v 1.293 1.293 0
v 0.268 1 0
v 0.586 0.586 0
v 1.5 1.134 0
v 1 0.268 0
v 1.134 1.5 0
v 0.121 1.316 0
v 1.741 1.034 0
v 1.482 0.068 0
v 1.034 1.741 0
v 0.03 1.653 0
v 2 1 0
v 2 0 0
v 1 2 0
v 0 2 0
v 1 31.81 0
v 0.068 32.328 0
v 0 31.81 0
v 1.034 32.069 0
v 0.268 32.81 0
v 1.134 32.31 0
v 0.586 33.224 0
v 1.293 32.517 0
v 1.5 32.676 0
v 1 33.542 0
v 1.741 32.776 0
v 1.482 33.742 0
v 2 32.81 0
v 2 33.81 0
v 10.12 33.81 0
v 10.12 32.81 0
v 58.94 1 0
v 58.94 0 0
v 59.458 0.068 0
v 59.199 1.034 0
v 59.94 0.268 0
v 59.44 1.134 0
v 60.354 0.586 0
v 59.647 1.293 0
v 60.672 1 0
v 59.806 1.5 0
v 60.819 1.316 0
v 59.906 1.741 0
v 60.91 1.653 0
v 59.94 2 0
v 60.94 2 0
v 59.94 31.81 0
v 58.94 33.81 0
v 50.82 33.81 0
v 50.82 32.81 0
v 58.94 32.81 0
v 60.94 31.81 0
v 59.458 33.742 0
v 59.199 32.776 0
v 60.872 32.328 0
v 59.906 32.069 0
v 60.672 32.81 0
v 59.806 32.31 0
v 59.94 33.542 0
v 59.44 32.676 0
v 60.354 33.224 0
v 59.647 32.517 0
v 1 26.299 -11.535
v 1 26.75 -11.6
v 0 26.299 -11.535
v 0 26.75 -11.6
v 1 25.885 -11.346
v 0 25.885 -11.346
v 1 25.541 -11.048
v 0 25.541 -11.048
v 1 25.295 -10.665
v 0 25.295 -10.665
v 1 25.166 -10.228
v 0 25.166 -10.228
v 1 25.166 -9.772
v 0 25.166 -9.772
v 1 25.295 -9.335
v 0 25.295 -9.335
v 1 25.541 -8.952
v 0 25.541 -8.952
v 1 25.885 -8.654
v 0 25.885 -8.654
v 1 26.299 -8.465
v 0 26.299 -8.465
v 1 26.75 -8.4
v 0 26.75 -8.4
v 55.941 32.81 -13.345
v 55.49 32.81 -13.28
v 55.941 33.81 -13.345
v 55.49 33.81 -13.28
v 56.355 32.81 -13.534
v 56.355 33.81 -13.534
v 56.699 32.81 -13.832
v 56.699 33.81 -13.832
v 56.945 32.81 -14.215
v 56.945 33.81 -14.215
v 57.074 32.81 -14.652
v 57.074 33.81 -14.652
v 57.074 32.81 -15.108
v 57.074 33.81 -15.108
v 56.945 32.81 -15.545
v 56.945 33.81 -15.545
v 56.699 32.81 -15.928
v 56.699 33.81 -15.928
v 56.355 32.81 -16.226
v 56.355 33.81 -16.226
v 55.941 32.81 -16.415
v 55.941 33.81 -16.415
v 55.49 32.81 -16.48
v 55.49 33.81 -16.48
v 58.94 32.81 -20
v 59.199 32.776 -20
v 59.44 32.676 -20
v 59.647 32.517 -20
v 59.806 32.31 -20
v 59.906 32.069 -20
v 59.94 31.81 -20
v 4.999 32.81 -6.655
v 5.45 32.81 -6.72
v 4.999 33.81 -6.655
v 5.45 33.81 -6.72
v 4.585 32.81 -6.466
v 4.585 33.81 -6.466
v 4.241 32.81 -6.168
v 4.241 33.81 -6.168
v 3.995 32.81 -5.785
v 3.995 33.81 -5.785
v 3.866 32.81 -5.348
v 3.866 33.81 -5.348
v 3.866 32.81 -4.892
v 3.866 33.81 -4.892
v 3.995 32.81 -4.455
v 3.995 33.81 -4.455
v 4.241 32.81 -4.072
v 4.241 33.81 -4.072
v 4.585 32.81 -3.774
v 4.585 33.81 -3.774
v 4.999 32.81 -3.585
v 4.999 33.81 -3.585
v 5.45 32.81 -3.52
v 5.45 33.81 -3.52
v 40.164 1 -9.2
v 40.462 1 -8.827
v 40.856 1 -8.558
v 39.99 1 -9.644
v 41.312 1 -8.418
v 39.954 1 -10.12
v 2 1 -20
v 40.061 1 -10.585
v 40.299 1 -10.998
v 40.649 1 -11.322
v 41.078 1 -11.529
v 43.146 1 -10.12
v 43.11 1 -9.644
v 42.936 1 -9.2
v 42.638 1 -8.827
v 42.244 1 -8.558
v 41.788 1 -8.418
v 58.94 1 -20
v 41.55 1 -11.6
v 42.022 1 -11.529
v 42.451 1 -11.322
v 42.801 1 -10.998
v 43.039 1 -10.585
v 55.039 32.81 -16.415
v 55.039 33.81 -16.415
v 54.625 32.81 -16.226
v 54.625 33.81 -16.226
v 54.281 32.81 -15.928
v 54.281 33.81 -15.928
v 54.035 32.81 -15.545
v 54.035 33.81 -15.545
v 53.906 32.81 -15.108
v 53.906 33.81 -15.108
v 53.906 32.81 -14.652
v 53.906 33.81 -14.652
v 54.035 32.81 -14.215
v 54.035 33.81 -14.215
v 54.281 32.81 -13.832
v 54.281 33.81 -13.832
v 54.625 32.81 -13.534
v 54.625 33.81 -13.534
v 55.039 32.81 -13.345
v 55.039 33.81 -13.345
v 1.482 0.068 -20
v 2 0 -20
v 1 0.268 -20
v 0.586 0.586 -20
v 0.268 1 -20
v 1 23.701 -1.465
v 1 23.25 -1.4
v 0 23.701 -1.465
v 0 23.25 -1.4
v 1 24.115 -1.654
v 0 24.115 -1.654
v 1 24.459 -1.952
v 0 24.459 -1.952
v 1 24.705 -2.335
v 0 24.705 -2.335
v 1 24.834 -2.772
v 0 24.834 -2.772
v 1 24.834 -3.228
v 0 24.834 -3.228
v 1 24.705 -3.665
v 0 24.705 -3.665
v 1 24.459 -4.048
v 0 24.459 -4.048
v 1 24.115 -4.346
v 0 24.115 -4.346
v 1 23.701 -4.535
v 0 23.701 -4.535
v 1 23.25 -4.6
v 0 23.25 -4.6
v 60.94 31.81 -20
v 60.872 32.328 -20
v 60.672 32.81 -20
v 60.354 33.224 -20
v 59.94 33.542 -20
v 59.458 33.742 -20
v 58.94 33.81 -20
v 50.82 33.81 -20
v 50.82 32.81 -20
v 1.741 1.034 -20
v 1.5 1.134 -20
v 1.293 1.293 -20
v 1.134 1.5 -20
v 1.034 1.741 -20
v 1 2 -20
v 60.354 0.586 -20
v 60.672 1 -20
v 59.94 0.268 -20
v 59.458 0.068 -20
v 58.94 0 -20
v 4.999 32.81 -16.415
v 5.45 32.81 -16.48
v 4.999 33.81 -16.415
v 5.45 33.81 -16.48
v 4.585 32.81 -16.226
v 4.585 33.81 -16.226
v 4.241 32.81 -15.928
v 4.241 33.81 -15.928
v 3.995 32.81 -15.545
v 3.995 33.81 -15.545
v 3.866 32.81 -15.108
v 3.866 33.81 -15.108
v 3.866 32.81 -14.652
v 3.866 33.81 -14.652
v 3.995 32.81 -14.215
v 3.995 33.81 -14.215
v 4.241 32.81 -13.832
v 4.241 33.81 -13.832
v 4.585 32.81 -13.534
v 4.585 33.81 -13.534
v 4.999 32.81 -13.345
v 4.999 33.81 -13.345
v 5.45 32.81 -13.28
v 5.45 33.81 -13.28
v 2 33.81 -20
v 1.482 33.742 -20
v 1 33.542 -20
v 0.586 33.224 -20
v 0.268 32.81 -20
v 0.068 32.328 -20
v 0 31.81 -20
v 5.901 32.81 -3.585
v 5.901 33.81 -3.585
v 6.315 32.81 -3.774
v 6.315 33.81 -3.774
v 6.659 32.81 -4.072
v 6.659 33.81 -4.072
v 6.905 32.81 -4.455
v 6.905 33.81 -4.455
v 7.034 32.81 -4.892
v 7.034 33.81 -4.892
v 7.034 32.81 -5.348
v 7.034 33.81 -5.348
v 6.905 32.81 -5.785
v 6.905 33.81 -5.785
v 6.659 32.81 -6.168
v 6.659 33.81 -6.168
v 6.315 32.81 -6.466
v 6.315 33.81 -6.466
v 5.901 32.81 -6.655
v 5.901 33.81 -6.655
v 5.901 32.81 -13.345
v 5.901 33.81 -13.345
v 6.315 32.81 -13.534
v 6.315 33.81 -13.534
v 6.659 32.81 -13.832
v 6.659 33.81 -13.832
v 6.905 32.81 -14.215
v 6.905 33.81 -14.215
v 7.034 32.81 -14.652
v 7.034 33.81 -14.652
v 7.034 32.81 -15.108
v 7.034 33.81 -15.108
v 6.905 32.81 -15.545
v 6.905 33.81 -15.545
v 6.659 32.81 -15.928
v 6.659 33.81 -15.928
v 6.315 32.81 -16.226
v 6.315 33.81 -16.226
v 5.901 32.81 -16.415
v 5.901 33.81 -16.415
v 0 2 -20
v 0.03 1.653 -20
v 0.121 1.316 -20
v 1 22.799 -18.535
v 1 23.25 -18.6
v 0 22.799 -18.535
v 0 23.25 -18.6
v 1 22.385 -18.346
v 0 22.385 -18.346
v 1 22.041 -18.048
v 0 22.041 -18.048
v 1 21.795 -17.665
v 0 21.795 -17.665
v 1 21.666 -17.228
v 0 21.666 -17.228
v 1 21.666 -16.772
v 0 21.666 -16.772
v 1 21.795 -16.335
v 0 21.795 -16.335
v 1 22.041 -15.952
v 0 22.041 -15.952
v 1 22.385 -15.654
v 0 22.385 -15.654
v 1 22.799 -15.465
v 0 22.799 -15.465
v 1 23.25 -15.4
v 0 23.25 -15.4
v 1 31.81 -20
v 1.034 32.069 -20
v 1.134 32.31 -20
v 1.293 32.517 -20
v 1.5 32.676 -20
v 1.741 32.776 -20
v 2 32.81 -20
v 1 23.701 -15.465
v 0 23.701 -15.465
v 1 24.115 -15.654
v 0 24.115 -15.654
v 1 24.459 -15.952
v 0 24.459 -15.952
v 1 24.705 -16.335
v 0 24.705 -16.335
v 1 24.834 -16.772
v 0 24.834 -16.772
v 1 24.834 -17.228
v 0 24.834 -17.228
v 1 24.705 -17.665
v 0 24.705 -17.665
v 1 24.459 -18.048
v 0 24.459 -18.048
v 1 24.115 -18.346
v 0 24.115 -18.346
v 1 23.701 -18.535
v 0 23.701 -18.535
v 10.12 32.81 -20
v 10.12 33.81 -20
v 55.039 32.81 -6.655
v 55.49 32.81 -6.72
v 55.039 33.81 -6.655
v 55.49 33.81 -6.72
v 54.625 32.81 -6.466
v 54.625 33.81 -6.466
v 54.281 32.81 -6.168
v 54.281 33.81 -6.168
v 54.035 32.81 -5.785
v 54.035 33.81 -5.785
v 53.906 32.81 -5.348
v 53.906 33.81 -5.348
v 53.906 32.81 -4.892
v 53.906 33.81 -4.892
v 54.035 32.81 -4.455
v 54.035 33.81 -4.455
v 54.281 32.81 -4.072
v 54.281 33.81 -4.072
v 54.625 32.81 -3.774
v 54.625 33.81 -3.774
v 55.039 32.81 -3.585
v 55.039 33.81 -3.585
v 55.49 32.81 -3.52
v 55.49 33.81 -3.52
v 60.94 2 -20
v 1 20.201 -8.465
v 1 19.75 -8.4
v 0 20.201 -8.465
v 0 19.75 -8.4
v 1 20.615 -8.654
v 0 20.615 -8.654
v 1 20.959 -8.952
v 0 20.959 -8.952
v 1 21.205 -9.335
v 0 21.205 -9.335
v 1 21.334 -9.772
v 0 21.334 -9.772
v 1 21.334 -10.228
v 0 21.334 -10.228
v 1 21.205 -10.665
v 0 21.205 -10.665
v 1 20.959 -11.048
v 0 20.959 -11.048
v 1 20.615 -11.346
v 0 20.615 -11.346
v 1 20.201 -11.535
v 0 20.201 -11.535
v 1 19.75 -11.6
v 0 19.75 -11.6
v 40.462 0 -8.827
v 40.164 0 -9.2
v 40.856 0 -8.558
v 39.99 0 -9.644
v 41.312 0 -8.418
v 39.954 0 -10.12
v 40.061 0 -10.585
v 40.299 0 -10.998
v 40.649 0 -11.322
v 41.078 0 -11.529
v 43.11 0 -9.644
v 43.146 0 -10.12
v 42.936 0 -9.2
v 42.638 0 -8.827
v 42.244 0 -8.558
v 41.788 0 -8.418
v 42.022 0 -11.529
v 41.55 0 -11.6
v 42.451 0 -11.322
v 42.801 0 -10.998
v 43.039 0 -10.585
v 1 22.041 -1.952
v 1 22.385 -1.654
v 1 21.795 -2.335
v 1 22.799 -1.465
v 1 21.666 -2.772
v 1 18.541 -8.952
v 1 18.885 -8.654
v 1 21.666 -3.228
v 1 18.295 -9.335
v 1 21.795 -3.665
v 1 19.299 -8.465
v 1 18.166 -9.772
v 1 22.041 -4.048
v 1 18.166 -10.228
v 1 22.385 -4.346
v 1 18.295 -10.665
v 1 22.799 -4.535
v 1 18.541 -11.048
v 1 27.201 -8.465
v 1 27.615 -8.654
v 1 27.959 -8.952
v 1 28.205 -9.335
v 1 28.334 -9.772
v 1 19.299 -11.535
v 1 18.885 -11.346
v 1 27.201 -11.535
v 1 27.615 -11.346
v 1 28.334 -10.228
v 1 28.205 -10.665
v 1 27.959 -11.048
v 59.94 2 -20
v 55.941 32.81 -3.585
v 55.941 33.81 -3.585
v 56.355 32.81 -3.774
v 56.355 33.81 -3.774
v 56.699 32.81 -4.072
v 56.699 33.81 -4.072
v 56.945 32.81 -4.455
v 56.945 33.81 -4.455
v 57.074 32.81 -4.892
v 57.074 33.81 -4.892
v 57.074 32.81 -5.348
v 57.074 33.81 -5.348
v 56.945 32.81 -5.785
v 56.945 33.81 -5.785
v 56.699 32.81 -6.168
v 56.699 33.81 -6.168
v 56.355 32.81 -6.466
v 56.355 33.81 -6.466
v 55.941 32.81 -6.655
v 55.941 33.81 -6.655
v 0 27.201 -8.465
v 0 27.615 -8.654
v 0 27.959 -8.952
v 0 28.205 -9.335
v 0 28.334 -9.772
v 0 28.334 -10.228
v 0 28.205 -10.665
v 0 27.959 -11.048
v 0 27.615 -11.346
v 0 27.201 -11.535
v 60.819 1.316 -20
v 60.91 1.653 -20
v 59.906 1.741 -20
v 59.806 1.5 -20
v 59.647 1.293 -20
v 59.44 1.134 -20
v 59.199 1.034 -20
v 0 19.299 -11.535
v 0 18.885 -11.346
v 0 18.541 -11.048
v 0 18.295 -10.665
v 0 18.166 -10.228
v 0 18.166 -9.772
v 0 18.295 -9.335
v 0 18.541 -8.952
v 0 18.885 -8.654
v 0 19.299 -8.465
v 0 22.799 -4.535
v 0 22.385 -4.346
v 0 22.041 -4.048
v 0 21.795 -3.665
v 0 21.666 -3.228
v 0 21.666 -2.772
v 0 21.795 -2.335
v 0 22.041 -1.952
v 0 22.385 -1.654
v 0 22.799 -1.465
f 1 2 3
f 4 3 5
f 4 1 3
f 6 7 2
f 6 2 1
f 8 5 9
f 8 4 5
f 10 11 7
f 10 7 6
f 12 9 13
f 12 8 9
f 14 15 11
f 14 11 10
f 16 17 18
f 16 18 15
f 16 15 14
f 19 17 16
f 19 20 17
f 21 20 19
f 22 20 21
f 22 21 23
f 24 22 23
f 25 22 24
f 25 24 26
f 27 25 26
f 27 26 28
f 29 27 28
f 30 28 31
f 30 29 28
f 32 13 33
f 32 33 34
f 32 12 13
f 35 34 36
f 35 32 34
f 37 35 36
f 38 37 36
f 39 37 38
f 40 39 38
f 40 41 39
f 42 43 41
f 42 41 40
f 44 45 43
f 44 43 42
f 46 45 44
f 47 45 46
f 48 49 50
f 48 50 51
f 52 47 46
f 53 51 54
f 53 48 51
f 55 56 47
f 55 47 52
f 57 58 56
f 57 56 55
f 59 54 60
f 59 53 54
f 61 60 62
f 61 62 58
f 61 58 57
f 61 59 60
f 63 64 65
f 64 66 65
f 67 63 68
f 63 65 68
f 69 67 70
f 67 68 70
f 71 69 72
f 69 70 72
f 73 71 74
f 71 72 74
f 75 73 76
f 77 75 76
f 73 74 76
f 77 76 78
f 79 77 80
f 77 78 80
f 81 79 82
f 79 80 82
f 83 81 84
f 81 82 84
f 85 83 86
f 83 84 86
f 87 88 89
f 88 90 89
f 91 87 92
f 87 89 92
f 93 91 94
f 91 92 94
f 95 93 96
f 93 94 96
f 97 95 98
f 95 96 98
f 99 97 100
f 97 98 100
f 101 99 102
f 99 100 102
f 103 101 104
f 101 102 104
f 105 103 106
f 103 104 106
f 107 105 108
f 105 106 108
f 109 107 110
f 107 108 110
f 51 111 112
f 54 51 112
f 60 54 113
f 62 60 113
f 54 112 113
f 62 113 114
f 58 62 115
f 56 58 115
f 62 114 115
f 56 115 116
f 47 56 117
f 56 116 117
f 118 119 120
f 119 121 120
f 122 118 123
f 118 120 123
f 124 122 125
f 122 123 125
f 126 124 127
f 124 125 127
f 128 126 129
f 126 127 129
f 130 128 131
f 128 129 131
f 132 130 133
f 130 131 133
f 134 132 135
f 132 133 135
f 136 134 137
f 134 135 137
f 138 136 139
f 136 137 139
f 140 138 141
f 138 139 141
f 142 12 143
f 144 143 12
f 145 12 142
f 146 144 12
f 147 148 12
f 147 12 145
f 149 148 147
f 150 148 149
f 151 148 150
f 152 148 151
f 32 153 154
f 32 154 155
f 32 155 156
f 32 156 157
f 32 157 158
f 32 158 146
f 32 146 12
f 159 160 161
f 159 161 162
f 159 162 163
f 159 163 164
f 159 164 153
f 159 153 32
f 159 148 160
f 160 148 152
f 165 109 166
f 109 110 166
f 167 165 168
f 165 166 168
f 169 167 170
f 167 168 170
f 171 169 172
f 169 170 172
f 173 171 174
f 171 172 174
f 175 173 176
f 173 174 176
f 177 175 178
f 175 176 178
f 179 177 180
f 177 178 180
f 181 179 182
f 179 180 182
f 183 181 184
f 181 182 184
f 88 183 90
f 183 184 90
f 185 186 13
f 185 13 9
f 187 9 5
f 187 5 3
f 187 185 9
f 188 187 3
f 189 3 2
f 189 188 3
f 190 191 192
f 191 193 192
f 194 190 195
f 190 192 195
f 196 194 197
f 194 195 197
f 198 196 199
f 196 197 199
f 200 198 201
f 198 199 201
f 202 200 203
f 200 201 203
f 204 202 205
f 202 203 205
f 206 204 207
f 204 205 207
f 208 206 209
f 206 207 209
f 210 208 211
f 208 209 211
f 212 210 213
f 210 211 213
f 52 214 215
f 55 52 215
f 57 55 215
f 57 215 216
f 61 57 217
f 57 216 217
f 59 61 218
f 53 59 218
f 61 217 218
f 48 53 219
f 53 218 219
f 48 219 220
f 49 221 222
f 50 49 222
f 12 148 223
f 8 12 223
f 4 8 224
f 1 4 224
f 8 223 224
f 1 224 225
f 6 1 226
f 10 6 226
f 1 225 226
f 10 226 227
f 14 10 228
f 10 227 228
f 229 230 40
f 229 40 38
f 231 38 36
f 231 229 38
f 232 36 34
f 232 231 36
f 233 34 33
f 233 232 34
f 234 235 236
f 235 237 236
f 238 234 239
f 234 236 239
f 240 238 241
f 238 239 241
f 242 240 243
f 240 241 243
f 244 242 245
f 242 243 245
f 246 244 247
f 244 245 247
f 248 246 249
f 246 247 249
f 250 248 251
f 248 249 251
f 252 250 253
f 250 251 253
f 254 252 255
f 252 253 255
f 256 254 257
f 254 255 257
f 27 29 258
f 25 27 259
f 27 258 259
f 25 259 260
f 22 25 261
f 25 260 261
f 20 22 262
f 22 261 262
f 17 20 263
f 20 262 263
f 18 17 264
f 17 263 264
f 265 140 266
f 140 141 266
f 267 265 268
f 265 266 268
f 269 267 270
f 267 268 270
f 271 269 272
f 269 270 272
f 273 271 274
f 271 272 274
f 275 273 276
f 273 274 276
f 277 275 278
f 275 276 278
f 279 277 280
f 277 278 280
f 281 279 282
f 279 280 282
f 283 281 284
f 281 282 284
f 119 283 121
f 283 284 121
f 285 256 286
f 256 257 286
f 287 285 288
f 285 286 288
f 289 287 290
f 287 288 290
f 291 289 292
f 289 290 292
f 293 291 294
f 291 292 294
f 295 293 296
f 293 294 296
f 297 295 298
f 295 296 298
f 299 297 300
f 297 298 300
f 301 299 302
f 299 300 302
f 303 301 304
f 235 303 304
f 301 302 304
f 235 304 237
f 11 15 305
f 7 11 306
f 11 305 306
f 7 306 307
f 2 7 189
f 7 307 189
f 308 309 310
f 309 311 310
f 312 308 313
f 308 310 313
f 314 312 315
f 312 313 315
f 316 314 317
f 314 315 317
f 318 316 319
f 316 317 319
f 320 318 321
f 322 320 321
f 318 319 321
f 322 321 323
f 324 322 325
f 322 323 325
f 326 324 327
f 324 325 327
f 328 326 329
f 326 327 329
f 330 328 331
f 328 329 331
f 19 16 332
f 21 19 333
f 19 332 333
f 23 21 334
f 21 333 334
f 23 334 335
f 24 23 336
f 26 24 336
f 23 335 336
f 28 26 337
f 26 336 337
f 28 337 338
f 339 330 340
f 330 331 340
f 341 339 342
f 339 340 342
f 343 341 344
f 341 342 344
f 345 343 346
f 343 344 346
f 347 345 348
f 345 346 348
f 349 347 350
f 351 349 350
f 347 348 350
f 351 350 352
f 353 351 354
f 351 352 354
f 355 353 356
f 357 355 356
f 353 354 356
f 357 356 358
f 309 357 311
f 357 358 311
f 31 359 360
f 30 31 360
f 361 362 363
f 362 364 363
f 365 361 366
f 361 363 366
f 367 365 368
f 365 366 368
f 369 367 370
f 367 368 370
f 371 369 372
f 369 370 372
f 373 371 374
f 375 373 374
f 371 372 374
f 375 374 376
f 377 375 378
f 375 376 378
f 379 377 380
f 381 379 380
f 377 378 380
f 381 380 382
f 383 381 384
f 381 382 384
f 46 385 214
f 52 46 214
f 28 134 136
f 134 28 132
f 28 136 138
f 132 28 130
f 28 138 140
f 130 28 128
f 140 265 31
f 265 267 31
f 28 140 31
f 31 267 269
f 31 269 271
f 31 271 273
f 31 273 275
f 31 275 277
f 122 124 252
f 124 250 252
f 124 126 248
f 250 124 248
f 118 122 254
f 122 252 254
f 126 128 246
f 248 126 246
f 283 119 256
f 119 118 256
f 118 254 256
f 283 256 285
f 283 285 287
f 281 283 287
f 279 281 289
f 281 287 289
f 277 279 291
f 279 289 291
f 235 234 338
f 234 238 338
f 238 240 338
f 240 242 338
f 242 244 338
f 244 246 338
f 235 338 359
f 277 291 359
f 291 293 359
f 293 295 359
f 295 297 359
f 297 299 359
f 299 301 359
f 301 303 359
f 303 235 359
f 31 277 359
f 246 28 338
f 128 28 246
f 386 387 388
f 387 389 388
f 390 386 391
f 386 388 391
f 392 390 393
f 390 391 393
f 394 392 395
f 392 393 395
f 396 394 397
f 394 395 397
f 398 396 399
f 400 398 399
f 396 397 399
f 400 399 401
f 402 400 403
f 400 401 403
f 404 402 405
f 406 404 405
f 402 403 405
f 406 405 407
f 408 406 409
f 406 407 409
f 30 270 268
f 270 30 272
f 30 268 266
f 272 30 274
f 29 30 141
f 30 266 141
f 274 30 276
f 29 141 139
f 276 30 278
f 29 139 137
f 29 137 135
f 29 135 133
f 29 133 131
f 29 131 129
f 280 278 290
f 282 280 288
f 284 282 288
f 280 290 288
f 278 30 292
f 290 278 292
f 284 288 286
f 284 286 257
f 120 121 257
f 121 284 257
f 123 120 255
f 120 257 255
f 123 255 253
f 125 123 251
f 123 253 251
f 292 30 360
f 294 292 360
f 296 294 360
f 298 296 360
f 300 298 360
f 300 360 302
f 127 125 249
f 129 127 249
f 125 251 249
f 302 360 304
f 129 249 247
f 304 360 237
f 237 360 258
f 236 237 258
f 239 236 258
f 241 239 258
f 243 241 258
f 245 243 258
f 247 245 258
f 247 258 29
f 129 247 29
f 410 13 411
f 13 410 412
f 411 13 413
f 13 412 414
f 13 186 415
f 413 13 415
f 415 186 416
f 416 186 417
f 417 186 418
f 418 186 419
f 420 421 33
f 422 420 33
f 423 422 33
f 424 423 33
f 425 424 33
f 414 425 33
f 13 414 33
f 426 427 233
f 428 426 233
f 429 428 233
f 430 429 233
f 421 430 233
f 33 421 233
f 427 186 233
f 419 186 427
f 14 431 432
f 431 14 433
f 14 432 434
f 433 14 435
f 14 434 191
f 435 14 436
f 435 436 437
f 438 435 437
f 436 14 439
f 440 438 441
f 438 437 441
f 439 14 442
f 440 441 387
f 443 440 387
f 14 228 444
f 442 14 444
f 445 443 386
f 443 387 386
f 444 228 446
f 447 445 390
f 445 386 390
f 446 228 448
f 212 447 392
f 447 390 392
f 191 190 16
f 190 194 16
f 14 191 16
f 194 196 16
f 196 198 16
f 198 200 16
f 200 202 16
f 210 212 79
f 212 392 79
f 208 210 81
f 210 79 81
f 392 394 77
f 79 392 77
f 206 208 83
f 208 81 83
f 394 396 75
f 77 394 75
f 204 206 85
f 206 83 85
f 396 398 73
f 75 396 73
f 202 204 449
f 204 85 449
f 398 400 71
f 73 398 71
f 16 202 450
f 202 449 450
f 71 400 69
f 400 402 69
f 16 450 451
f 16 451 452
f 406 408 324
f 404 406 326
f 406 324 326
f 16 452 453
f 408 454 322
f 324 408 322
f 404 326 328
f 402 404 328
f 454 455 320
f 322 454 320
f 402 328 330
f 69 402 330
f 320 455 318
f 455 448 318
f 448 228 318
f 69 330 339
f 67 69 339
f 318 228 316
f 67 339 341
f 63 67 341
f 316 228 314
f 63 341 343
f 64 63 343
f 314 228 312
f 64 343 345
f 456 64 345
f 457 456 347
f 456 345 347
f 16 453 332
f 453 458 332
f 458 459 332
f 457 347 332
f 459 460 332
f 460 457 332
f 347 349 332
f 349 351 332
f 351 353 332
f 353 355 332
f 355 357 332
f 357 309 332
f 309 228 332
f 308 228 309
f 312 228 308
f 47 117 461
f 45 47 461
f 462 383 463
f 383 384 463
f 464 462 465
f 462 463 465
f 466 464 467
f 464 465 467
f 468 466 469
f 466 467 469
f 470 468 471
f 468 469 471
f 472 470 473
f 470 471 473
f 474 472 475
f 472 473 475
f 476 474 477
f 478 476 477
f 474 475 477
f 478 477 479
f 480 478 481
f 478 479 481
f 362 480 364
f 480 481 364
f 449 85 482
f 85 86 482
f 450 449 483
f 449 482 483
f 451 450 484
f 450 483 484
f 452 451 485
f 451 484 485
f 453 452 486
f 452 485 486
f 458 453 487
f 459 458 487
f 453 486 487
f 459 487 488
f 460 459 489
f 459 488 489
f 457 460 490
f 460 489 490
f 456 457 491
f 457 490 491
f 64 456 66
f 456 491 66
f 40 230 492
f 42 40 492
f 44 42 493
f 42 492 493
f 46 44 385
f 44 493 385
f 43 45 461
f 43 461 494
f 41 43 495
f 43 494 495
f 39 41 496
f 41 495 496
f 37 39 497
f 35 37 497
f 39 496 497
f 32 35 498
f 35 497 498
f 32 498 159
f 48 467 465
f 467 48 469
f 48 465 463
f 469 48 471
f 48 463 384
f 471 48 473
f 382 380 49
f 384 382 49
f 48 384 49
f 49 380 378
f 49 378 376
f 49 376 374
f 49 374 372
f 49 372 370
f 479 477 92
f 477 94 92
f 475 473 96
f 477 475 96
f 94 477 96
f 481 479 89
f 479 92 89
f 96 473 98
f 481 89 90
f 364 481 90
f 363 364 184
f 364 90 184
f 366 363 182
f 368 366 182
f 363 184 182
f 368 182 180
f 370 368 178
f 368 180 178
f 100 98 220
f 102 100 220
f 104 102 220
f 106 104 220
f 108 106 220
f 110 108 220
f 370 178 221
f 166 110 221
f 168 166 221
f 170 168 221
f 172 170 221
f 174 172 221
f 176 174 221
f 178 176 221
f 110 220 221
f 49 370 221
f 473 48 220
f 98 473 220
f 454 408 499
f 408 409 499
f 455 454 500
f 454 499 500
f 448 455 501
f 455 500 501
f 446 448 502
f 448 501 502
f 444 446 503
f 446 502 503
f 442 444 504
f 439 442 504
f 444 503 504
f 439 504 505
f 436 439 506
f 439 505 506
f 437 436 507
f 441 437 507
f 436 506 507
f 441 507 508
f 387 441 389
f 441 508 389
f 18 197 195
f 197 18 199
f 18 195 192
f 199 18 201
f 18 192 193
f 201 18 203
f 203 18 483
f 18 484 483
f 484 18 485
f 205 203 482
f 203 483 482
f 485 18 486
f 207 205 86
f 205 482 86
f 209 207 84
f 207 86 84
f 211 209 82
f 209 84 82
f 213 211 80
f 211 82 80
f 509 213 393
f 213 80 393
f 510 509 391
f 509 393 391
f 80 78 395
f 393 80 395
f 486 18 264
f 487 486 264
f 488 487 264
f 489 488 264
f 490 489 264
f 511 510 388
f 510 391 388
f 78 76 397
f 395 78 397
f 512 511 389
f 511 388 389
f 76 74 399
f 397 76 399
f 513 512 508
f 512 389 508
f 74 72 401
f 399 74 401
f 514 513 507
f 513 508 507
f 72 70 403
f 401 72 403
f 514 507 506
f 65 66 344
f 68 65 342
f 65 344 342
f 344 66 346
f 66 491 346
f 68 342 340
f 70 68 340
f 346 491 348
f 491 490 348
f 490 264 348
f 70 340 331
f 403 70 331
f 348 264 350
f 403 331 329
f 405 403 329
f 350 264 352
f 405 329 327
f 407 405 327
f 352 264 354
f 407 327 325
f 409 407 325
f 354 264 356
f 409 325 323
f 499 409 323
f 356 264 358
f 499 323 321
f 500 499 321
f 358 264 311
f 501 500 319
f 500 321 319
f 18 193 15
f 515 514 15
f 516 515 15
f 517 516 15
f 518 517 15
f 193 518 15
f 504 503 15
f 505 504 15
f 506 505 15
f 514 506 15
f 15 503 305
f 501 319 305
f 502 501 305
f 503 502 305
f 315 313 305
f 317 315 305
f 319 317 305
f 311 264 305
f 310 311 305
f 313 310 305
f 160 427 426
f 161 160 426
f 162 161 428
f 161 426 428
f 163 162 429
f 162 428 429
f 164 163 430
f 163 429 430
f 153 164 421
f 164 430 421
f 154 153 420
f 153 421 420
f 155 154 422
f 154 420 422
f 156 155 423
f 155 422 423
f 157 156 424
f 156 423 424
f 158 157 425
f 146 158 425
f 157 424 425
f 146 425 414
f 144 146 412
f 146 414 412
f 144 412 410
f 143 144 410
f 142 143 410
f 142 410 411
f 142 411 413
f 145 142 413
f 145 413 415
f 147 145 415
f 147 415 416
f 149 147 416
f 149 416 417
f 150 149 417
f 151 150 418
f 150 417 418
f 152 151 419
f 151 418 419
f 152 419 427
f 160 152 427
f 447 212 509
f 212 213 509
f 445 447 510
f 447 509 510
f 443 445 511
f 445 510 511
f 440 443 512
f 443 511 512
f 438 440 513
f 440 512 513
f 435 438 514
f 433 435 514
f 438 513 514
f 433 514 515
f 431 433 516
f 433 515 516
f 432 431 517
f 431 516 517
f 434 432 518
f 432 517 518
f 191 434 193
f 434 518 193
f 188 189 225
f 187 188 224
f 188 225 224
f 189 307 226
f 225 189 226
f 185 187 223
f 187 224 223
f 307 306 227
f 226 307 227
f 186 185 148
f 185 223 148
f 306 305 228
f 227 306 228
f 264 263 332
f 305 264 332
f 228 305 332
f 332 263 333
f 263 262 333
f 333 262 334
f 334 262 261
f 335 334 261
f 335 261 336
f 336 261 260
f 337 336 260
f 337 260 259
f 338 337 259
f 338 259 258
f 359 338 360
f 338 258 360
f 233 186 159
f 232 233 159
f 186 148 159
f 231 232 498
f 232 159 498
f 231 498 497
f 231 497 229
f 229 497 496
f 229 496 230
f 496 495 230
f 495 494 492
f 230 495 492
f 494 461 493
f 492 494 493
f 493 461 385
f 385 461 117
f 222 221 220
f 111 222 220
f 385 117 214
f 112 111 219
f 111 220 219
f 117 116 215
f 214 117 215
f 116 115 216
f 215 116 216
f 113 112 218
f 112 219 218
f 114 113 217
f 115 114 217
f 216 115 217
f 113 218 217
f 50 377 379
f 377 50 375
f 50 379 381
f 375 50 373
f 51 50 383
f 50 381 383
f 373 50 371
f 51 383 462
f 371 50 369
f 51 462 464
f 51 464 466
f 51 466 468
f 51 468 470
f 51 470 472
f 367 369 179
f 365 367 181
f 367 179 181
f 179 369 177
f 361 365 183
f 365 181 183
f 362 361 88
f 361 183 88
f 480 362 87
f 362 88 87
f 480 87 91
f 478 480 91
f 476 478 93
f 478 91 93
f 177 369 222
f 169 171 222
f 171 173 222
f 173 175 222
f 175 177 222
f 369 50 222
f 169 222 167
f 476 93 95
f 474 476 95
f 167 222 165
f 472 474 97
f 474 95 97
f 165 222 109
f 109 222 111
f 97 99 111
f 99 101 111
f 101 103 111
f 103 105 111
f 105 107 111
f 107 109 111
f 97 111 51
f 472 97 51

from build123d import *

# Parameters (mm, degrees)
SKETCH_2_W                = 60.94
SKETCH_2_H                = 20
EXTRUDE_1_DEPTH           = 1
SKETCH_3_W                = 1
SKETCH_3_H                = 20
EXTRUDE_2_DEPTH           = 32.81
SKETCH_4_W                = 1
SKETCH_4_H                = 20
EXTRUDE_3_DEPTH           = 32.81
SKETCH_9_W                = 20
SKETCH_9_H                = 1
EXTRUDE_8_DEPTH           = 9.12
SKETCH_10_W               = 20
SKETCH_10_H               = 1
EXTRUDE_9_DEPTH           = 9.12
SKETCH_13_R               = 1.6
CUT_EXTRUDE_2_DEPTH       = 1
SKETCH_14_R               = 1.6
CUT_EXTRUDE_3_DEPTH       = 1
SKETCH_15_R               = 1.6
CUT_EXTRUDE_4_DEPTH       = 1
SKETCH_16_R               = 1.6
CUT_EXTRUDE_5_DEPTH       = 1
SKETCH_17_R               = 1.6
CUT_EXTRUDE_6_DEPTH       = 1
SKETCH_19_R               = 1.6
CUT_EXTRUDE_7_DEPTH       = 1
SKETCH_20_R               = 1.6
CUT_EXTRUDE_8_DEPTH       = 1
SKETCH_22_R               = 1.6
CUT_EXTRUDE_9_DEPTH       = 1
SKETCH_23_R               = 1.6
CUT_EXTRUDE_10_DEPTH      = 1
SHEET_START               = 1
SHEET_METAL_1_OUTLINE_W   = 10.12
SHEET_METAL_1_OUTLINE_H   = 20
SHEET_METAL_1_OUTLINE_R   = 1.6
SHEET_METAL_1_DEPTH       = 32.81
SHEET_METAL_1_2_OUTLINE_W = 40.64238898
SHEET_METAL_1_2_OUTLINE_H = 20
SHEET_METAL_1_2_OUTLINE_R = 1.6
SHEET_METAL_1_2_DEPTH     = 1
SHEET_START_2             = -20
SHEET_METAL_1_3_DEPTH     = 20
SHEET_METAL_1_3_2_DEPTH   = 20


with BuildPart() as part:
    # Sketch 2 → ﾎﾞｽ - 押し出し1 (new body)
    with BuildSketch(Plane(origin=(0, 0, 0), x_dir=(1, 0, 0), z_dir=(0, 1, 0))):
        with Locations((30.47, 10)):
            Rectangle(SKETCH_2_W, SKETCH_2_H)
    extrude(amount=EXTRUDE_1_DEPTH)

    # ｽｹｯﾁ3 → ﾎﾞｽ - 押し出し2 (add)
    with BuildSketch(Plane(origin=(0, 1, 0), x_dir=(1, 0, 0), z_dir=(0, 1, 0))):
        with Locations((60.44, 10)):
            Rectangle(SKETCH_3_W, SKETCH_3_H)
    extrude(amount=EXTRUDE_2_DEPTH)

    # ｽｹｯﾁ4 → ﾎﾞｽ - 押し出し3 (add)
    with BuildSketch(Plane(origin=(0, 1, 0), x_dir=(1, 0, 0), z_dir=(0, 1, 0))):
        with Locations((0.5, 10)):
            Rectangle(SKETCH_4_W, SKETCH_4_H)
    extrude(amount=EXTRUDE_3_DEPTH)

    # ｽｹｯﾁ9 → ﾎﾞｽ - 押し出し8 (add)
    with BuildSketch(Plane.ZY.offset(-59.94)):
        with Locations((-10, 33.31)):
            Rectangle(SKETCH_9_W, SKETCH_9_H)
    extrude(amount=EXTRUDE_8_DEPTH)

    # ｽｹｯﾁ10 → ﾎﾞｽ - 押し出し9 (add)
    with BuildSketch(Plane(origin=(1, 0, 0), x_dir=(0, 0, -1), z_dir=(1, 0, 0))):
        with Locations((10, 33.31)):
            Rectangle(SKETCH_10_W, SKETCH_10_H)
    extrude(amount=EXTRUDE_9_DEPTH)

    # ｽｹｯﾁ13 → ｶｯﾄ - 押し出し2 (cut)
    with BuildSketch(Plane(origin=(0, 33.81, 0), x_dir=(1, 0, 0), z_dir=(0, 1, 0))):
        with Locations(Location((55.49, 5.12, 0), (0, 0, 270))):
            Circle(SKETCH_13_R)
    extrude(amount=-CUT_EXTRUDE_2_DEPTH, mode=Mode.SUBTRACT)

    # ｽｹｯﾁ14 → ｶｯﾄ - 押し出し3 (cut)
    with BuildSketch(Plane(origin=(0, 33.81, 0), x_dir=(1, 0, 0), z_dir=(0, 1, 0))):
        with Locations(Location((55.49, 14.88, 0), (0, 0, 270))):
            Circle(SKETCH_14_R)
    extrude(amount=-CUT_EXTRUDE_3_DEPTH, mode=Mode.SUBTRACT)

    # ｽｹｯﾁ15 → ｶｯﾄ - 押し出し4 (cut)
    with BuildSketch(Plane(origin=(0, 33.81, 0), x_dir=(1, 0, 0), z_dir=(0, 1, 0))):
        with Locations(Location((5.45, 5.12, 0), (0, 0, 270))):
            Circle(SKETCH_15_R)
    extrude(amount=-CUT_EXTRUDE_4_DEPTH, mode=Mode.SUBTRACT)

    # ｽｹｯﾁ16 → ｶｯﾄ - 押し出し5 (cut)
    with BuildSketch(Plane(origin=(0, 33.81, 0), x_dir=(1, 0, 0), z_dir=(0, 1, 0))):
        with Locations(Location((5.45, 14.88, 0), (0, 0, 270))):
            Circle(SKETCH_16_R)
    extrude(amount=-CUT_EXTRUDE_5_DEPTH, mode=Mode.SUBTRACT)

    # ｽｹｯﾁ17 → ｶｯﾄ - 押し出し6 (cut)
    with BuildSketch(Plane(origin=(0, 0, 0), x_dir=(-1, 0, 0), z_dir=(0, -1, 0))):
        with Locations(Location((-41.55, 10, 0), (0, 0, 90))):
            Circle(SKETCH_17_R)
    extrude(amount=-CUT_EXTRUDE_6_DEPTH, mode=Mode.SUBTRACT)

    # ｽｹｯﾁ19 → ｶｯﾄ - 押し出し7 (cut)
    with BuildSketch(Plane.ZY):
        with Locations((-3, 23.25)):
            Circle(SKETCH_19_R)
    extrude(amount=-CUT_EXTRUDE_7_DEPTH, mode=Mode.SUBTRACT)

    # ｽｹｯﾁ20 → ｶｯﾄ - 押し出し8 (cut)
    with BuildSketch(Plane.ZY):
        with Locations((-17, 23.25)):
            Circle(SKETCH_20_R)
    extrude(amount=-CUT_EXTRUDE_8_DEPTH, mode=Mode.SUBTRACT)

    # ｽｹｯﾁ22 → ｶｯﾄ - 押し出し9 (cut)
    with BuildSketch(Plane.ZY):
        with Locations((-10, 19.75)):
            Circle(SKETCH_22_R)
    extrude(amount=-CUT_EXTRUDE_9_DEPTH, mode=Mode.SUBTRACT)

    # ｽｹｯﾁ23 → ｶｯﾄ - 押し出し10 (cut)
    with BuildSketch(Plane.ZY):
        with Locations((-10, 26.75)):
            Circle(SKETCH_23_R)
    extrude(amount=-CUT_EXTRUDE_10_DEPTH, mode=Mode.SUBTRACT)

    # Sheet Metal 1: read off the stored shape, not the designer's step
    # Sheet Metal 1 outline → Sheet Metal 1 (cut)
    # profile 1 of 2: a face of its own
    with BuildSketch(Plane(origin=(0, 0, 0), x_dir=(1, 0, 0), z_dir=(0, 1, 0)).offset(SHEET_START)):
        with Locations((55.88, 10)):
            Rectangle(SHEET_METAL_1_OUTLINE_W, SHEET_METAL_1_OUTLINE_H)
        with Locations((55.49, 14.88)):
            Circle(SHEET_METAL_1_OUTLINE_R, mode=Mode.SUBTRACT)
        with Locations((55.49, 5.12)):
            Circle(SHEET_METAL_1_OUTLINE_R, mode=Mode.SUBTRACT)
    # profile 2 of 2: a face of its own
    with BuildSketch(Plane(origin=(0, 0, 0), x_dir=(1, 0, 0), z_dir=(0, 1, 0)).offset(SHEET_START)):
        with Locations((5.06, 10)):
            Rectangle(SHEET_METAL_1_OUTLINE_W, SHEET_METAL_1_OUTLINE_H)
        with Locations((5.45, 5.12)):
            Circle(SHEET_METAL_1_OUTLINE_R, mode=Mode.SUBTRACT)
        with Locations((5.45, 14.88)):
            Circle(SHEET_METAL_1_OUTLINE_R, mode=Mode.SUBTRACT)
    extrude(amount=SHEET_METAL_1_DEPTH, mode=Mode.SUBTRACT)

    # Sheet Metal 1 2 outline → Sheet Metal 1 2 (add)
    # profile 1 of 2: a face of its own
    with BuildSketch(Plane(origin=(0, 0, 0), x_dir=(1, 0, 0), z_dir=(0, 1, 0))):
        with Locations((81.26119449, 10)):
            Rectangle(SHEET_METAL_1_2_OUTLINE_W, SHEET_METAL_1_2_OUTLINE_H)
        with Locations((96.91238898, 5.12)):
            Circle(SHEET_METAL_1_2_OUTLINE_R, mode=Mode.SUBTRACT)
        with Locations((96.91238898, 14.88)):
            Circle(SHEET_METAL_1_2_OUTLINE_R, mode=Mode.SUBTRACT)
    # profile 2 of 2: a face of its own
    with BuildSketch(Plane(origin=(0, 0, 0), x_dir=(1, 0, 0), z_dir=(0, 1, 0))):
        with Locations((-20.32119449, 10)):
            Rectangle(SHEET_METAL_1_2_OUTLINE_W, SHEET_METAL_1_2_OUTLINE_H)
        with Locations((-21.60619449, 3)):
            Circle(SHEET_METAL_1_2_OUTLINE_R, mode=Mode.SUBTRACT)
        with Locations((-35.97238898, 5.12)):
            Circle(SHEET_METAL_1_2_OUTLINE_R, mode=Mode.SUBTRACT)
        with Locations((-25.10619449, 10)):
            Circle(SHEET_METAL_1_2_OUTLINE_R, mode=Mode.SUBTRACT)
        with Locations((-18.10619449, 10)):
            Circle(SHEET_METAL_1_2_OUTLINE_R, mode=Mode.SUBTRACT)
        with Locations((-35.97238898, 14.88)):
            Circle(SHEET_METAL_1_2_OUTLINE_R, mode=Mode.SUBTRACT)
        with Locations((-21.60619449, 17)):
            Circle(SHEET_METAL_1_2_OUTLINE_R, mode=Mode.SUBTRACT)
    extrude(amount=SHEET_METAL_1_2_DEPTH)

    # Sheet Metal 1 3: read off the stored shape, not the designer's step
    # Sheet Metal 1 3 outline → Sheet Metal 1 3 (cut)
    with BuildSketch(Plane.XY.offset(SHEET_START_2)):
        with BuildLine():
            ThreePointArc((2, 0), (1, 0.267949193), (0.267949193, 1))
            Line((0.267949193, 1), (-40.64238898, 1))
            Line((-40.64238898, 1), (-40.64238898, 0))
            Line((-40.64238898, 0), (2, 0))
        make_face()
        with BuildLine():
            Line((101.58238898, 1), (60.672050807, 1))
            ThreePointArc((60.672050807, 1), (59.94, 0.267949193), (58.94, 0))
            Line((58.94, 0), (101.58238898, 0))
            Line((101.58238898, 0), (101.58238898, 1))
        make_face()
    extrude(amount=SHEET_METAL_1_3_DEPTH, mode=Mode.SUBTRACT)

    # Sheet Metal 1 3 2 outline → Sheet Metal 1 3 2 (add)
    with BuildSketch(Plane.XY.offset(SHEET_START_2)):
        with BuildLine():
            Line((2, 32.81), (10.12, 32.81))
            Line((10.12, 32.81), (10.12, 33.81))
            Line((10.12, 33.81), (2, 33.81))
            ThreePointArc((2, 33.81), (0.585786438, 33.224213562), (0, 31.81))
            Line((0, 31.81), (0, 2))
            ThreePointArc((0, 2), (0.068148348, 1.48236191), (0.267949193, 1))
            Line((0.267949193, 1), (2, 1))
            ThreePointArc((2, 1), (1.292893219, 1.292893219), (1, 2))
            Line((1, 2), (1, 31.81))
            ThreePointArc((1, 31.81), (1.292893219, 32.517106781), (2, 32.81))
        make_face()
        with BuildLine():
            Line((58.94, 33.81), (50.82, 33.81))
            Line((50.82, 33.81), (50.82, 32.81))
            Line((50.82, 32.81), (58.94, 32.81))
            ThreePointArc((58.94, 32.81), (59.647106781, 32.517106781), (59.94, 31.81))
            Line((59.94, 31.81), (59.94, 2))
            ThreePointArc((59.94, 2), (59.647106781, 1.292893219), (58.94, 1))
            Line((58.94, 1), (60.672050807, 1))
            ThreePointArc((60.672050807, 1), (60.871851652, 1.48236191), (60.94, 2))
            Line((60.94, 2), (60.94, 31.81))
            ThreePointArc((60.94, 31.81), (60.354213562, 33.224213562), (58.94, 33.81))
        make_face()
    extrude(amount=SHEET_METAL_1_3_2_DEPTH)

    # Sheet Metal 1 3 3: loft between two sections, ruled curve by curve
    sheet_metal_1_3_3_from = [
        Edge.make_three_point_arc((5.45, 32.81, -3.52), (7.05, 32.81, -5.12), (5.45, 32.81, -6.72)),
        Edge.make_three_point_arc((5.45, 32.81, -6.72), (3.85, 32.81, -5.12), (5.45, 32.81, -3.52)),
    ]
    sheet_metal_1_3_3_to = [
        Edge.make_three_point_arc((5.45, 33.81, -3.52), (7.05, 33.81, -5.12), (5.45, 33.81, -6.72)),
        Edge.make_three_point_arc((5.45, 33.81, -6.72), (3.85, 33.81, -5.12), (5.45, 33.81, -3.52)),
    ]
    sheet_metal_1_3_3 = Solid(Shell([*[Face.make_surface_from_curves(sheet_metal_1_3_3_from[k], sheet_metal_1_3_3_to[k]) for k in range(2)], Face(Wire(sheet_metal_1_3_3_from)), Face(Wire(sheet_metal_1_3_3_to))]))
    add(sheet_metal_1_3_3, mode=Mode.SUBTRACT)

    # Sheet Metal 1 3 4: loft between two sections, ruled curve by curve
    sheet_metal_1_3_4_from = [
        Edge.make_three_point_arc((5.45, 32.81, -13.28), (7.05, 32.81, -14.88), (5.45, 32.81, -16.48)),
        Edge.make_three_point_arc((5.45, 32.81, -16.48), (3.85, 32.81, -14.88), (5.45, 32.81, -13.28)),
    ]
    sheet_metal_1_3_4_to = [
        Edge.make_three_point_arc((5.45, 33.81, -13.28), (7.05, 33.81, -14.88), (5.45, 33.81, -16.48)),
        Edge.make_three_point_arc((5.45, 33.81, -16.48), (3.85, 33.81, -14.88), (5.45, 33.81, -13.28)),
    ]
    sheet_metal_1_3_4 = Solid(Shell([*[Face.make_surface_from_curves(sheet_metal_1_3_4_from[k], sheet_metal_1_3_4_to[k]) for k in range(2)], Face(Wire(sheet_metal_1_3_4_from)), Face(Wire(sheet_metal_1_3_4_to))]))
    add(sheet_metal_1_3_4, mode=Mode.SUBTRACT)

    # Sheet Metal 1 3 5: loft between two sections, ruled curve by curve
    sheet_metal_1_3_5_from = [
        Edge.make_three_point_arc((55.49, 32.81, -3.52), (57.09, 32.81, -5.12), (55.49, 32.81, -6.72)),
        Edge.make_three_point_arc((55.49, 32.81, -6.72), (53.89, 32.81, -5.12), (55.49, 32.81, -3.52)),
    ]
    sheet_metal_1_3_5_to = [
        Edge.make_three_point_arc((55.49, 33.81, -3.52), (57.09, 33.81, -5.12), (55.49, 33.81, -6.72)),
        Edge.make_three_point_arc((55.49, 33.81, -6.72), (53.89, 33.81, -5.12), (55.49, 33.81, -3.52)),
    ]
    sheet_metal_1_3_5 = Solid(Shell([*[Face.make_surface_from_curves(sheet_metal_1_3_5_from[k], sheet_metal_1_3_5_to[k]) for k in range(2)], Face(Wire(sheet_metal_1_3_5_from)), Face(Wire(sheet_metal_1_3_5_to))]))
    add(sheet_metal_1_3_5, mode=Mode.SUBTRACT)

    # Sheet Metal 1 3 6: loft between two sections, ruled curve by curve
    sheet_metal_1_3_6_from = [
        Edge.make_three_point_arc((55.49, 32.81, -13.28), (57.09, 32.81, -14.88), (55.49, 32.81, -16.48)),
        Edge.make_three_point_arc((55.49, 32.81, -16.48), (53.89, 32.81, -14.88), (55.49, 32.81, -13.28)),
    ]
    sheet_metal_1_3_6_to = [
        Edge.make_three_point_arc((55.49, 33.81, -13.28), (57.09, 33.81, -14.88), (55.49, 33.81, -16.48)),
        Edge.make_three_point_arc((55.49, 33.81, -16.48), (53.89, 33.81, -14.88), (55.49, 33.81, -13.28)),
    ]
    sheet_metal_1_3_6 = Solid(Shell([*[Face.make_surface_from_curves(sheet_metal_1_3_6_from[k], sheet_metal_1_3_6_to[k]) for k in range(2)], Face(Wire(sheet_metal_1_3_6_from)), Face(Wire(sheet_metal_1_3_6_to))]))
    add(sheet_metal_1_3_6, mode=Mode.SUBTRACT)

    # Sheet Metal 1 3 7: loft between two sections, ruled curve by curve
    sheet_metal_1_3_7_from = [
        Edge.make_three_point_arc((1, 26.75, -8.4), (1, 28.35, -10), (1, 26.75, -11.6)),
        Edge.make_three_point_arc((1, 26.75, -11.6), (1, 25.15, -10), (1, 26.75, -8.4)),
    ]
    sheet_metal_1_3_7_to = [
        Edge.make_three_point_arc((0, 26.75, -8.4), (0, 28.35, -10), (0, 26.75, -11.6)),
        Edge.make_three_point_arc((0, 26.75, -11.6), (0, 25.15, -10), (0, 26.75, -8.4)),
    ]
    sheet_metal_1_3_7 = Solid(Shell([*[Face.make_surface_from_curves(sheet_metal_1_3_7_from[k], sheet_metal_1_3_7_to[k]) for k in range(2)], Face(Wire(sheet_metal_1_3_7_from)), Face(Wire(sheet_metal_1_3_7_to))]))
    add(sheet_metal_1_3_7, mode=Mode.SUBTRACT)

    # Sheet Metal 1 3 8: loft between two sections, ruled curve by curve
    sheet_metal_1_3_8_from = [
        Edge.make_three_point_arc((1, 19.75, -8.4), (1, 21.35, -10), (1, 19.75, -11.6)),
        Edge.make_three_point_arc((1, 19.75, -11.6), (1, 18.15, -10), (1, 19.75, -8.4)),
    ]
    sheet_metal_1_3_8_to = [
        Edge.make_three_point_arc((0, 19.75, -8.4), (0, 21.35, -10), (0, 19.75, -11.6)),
        Edge.make_three_point_arc((0, 19.75, -11.6), (0, 18.15, -10), (0, 19.75, -8.4)),
    ]
    sheet_metal_1_3_8 = Solid(Shell([*[Face.make_surface_from_curves(sheet_metal_1_3_8_from[k], sheet_metal_1_3_8_to[k]) for k in range(2)], Face(Wire(sheet_metal_1_3_8_from)), Face(Wire(sheet_metal_1_3_8_to))]))
    add(sheet_metal_1_3_8, mode=Mode.SUBTRACT)

    # Sheet Metal 1 3 9: loft between two sections, ruled curve by curve
    sheet_metal_1_3_9_from = [
        Edge.make_three_point_arc((1, 23.25, -15.4), (1, 24.85, -17), (1, 23.25, -18.6)),
        Edge.make_three_point_arc((1, 23.25, -18.6), (1, 21.65, -17), (1, 23.25, -15.4)),
    ]
    sheet_metal_1_3_9_to = [
        Edge.make_three_point_arc((0, 23.25, -15.4), (0, 24.85, -17), (0, 23.25, -18.6)),
        Edge.make_three_point_arc((0, 23.25, -18.6), (0, 21.65, -17), (0, 23.25, -15.4)),
    ]
    sheet_metal_1_3_9 = Solid(Shell([*[Face.make_surface_from_curves(sheet_metal_1_3_9_from[k], sheet_metal_1_3_9_to[k]) for k in range(2)], Face(Wire(sheet_metal_1_3_9_from)), Face(Wire(sheet_metal_1_3_9_to))]))
    add(sheet_metal_1_3_9, mode=Mode.SUBTRACT)

    # Sheet Metal 1 3 10: loft between two sections, ruled curve by curve
    sheet_metal_1_3_10_from = [
        Edge.make_three_point_arc((1, 23.25, -1.4), (1, 24.85, -3), (1, 23.25, -4.6)),
        Edge.make_three_point_arc((1, 23.25, -4.6), (1, 21.65, -3), (1, 23.25, -1.4)),
    ]
    sheet_metal_1_3_10_to = [
        Edge.make_three_point_arc((0, 23.25, -1.4), (0, 24.85, -3), (0, 23.25, -4.6)),
        Edge.make_three_point_arc((0, 23.25, -4.6), (0, 21.65, -3), (0, 23.25, -1.4)),
    ]
    sheet_metal_1_3_10 = Solid(Shell([*[Face.make_surface_from_curves(sheet_metal_1_3_10_from[k], sheet_metal_1_3_10_to[k]) for k in range(2)], Face(Wire(sheet_metal_1_3_10_from)), Face(Wire(sheet_metal_1_3_10_to))]))
    add(sheet_metal_1_3_10, mode=Mode.SUBTRACT)


solid = part.part
